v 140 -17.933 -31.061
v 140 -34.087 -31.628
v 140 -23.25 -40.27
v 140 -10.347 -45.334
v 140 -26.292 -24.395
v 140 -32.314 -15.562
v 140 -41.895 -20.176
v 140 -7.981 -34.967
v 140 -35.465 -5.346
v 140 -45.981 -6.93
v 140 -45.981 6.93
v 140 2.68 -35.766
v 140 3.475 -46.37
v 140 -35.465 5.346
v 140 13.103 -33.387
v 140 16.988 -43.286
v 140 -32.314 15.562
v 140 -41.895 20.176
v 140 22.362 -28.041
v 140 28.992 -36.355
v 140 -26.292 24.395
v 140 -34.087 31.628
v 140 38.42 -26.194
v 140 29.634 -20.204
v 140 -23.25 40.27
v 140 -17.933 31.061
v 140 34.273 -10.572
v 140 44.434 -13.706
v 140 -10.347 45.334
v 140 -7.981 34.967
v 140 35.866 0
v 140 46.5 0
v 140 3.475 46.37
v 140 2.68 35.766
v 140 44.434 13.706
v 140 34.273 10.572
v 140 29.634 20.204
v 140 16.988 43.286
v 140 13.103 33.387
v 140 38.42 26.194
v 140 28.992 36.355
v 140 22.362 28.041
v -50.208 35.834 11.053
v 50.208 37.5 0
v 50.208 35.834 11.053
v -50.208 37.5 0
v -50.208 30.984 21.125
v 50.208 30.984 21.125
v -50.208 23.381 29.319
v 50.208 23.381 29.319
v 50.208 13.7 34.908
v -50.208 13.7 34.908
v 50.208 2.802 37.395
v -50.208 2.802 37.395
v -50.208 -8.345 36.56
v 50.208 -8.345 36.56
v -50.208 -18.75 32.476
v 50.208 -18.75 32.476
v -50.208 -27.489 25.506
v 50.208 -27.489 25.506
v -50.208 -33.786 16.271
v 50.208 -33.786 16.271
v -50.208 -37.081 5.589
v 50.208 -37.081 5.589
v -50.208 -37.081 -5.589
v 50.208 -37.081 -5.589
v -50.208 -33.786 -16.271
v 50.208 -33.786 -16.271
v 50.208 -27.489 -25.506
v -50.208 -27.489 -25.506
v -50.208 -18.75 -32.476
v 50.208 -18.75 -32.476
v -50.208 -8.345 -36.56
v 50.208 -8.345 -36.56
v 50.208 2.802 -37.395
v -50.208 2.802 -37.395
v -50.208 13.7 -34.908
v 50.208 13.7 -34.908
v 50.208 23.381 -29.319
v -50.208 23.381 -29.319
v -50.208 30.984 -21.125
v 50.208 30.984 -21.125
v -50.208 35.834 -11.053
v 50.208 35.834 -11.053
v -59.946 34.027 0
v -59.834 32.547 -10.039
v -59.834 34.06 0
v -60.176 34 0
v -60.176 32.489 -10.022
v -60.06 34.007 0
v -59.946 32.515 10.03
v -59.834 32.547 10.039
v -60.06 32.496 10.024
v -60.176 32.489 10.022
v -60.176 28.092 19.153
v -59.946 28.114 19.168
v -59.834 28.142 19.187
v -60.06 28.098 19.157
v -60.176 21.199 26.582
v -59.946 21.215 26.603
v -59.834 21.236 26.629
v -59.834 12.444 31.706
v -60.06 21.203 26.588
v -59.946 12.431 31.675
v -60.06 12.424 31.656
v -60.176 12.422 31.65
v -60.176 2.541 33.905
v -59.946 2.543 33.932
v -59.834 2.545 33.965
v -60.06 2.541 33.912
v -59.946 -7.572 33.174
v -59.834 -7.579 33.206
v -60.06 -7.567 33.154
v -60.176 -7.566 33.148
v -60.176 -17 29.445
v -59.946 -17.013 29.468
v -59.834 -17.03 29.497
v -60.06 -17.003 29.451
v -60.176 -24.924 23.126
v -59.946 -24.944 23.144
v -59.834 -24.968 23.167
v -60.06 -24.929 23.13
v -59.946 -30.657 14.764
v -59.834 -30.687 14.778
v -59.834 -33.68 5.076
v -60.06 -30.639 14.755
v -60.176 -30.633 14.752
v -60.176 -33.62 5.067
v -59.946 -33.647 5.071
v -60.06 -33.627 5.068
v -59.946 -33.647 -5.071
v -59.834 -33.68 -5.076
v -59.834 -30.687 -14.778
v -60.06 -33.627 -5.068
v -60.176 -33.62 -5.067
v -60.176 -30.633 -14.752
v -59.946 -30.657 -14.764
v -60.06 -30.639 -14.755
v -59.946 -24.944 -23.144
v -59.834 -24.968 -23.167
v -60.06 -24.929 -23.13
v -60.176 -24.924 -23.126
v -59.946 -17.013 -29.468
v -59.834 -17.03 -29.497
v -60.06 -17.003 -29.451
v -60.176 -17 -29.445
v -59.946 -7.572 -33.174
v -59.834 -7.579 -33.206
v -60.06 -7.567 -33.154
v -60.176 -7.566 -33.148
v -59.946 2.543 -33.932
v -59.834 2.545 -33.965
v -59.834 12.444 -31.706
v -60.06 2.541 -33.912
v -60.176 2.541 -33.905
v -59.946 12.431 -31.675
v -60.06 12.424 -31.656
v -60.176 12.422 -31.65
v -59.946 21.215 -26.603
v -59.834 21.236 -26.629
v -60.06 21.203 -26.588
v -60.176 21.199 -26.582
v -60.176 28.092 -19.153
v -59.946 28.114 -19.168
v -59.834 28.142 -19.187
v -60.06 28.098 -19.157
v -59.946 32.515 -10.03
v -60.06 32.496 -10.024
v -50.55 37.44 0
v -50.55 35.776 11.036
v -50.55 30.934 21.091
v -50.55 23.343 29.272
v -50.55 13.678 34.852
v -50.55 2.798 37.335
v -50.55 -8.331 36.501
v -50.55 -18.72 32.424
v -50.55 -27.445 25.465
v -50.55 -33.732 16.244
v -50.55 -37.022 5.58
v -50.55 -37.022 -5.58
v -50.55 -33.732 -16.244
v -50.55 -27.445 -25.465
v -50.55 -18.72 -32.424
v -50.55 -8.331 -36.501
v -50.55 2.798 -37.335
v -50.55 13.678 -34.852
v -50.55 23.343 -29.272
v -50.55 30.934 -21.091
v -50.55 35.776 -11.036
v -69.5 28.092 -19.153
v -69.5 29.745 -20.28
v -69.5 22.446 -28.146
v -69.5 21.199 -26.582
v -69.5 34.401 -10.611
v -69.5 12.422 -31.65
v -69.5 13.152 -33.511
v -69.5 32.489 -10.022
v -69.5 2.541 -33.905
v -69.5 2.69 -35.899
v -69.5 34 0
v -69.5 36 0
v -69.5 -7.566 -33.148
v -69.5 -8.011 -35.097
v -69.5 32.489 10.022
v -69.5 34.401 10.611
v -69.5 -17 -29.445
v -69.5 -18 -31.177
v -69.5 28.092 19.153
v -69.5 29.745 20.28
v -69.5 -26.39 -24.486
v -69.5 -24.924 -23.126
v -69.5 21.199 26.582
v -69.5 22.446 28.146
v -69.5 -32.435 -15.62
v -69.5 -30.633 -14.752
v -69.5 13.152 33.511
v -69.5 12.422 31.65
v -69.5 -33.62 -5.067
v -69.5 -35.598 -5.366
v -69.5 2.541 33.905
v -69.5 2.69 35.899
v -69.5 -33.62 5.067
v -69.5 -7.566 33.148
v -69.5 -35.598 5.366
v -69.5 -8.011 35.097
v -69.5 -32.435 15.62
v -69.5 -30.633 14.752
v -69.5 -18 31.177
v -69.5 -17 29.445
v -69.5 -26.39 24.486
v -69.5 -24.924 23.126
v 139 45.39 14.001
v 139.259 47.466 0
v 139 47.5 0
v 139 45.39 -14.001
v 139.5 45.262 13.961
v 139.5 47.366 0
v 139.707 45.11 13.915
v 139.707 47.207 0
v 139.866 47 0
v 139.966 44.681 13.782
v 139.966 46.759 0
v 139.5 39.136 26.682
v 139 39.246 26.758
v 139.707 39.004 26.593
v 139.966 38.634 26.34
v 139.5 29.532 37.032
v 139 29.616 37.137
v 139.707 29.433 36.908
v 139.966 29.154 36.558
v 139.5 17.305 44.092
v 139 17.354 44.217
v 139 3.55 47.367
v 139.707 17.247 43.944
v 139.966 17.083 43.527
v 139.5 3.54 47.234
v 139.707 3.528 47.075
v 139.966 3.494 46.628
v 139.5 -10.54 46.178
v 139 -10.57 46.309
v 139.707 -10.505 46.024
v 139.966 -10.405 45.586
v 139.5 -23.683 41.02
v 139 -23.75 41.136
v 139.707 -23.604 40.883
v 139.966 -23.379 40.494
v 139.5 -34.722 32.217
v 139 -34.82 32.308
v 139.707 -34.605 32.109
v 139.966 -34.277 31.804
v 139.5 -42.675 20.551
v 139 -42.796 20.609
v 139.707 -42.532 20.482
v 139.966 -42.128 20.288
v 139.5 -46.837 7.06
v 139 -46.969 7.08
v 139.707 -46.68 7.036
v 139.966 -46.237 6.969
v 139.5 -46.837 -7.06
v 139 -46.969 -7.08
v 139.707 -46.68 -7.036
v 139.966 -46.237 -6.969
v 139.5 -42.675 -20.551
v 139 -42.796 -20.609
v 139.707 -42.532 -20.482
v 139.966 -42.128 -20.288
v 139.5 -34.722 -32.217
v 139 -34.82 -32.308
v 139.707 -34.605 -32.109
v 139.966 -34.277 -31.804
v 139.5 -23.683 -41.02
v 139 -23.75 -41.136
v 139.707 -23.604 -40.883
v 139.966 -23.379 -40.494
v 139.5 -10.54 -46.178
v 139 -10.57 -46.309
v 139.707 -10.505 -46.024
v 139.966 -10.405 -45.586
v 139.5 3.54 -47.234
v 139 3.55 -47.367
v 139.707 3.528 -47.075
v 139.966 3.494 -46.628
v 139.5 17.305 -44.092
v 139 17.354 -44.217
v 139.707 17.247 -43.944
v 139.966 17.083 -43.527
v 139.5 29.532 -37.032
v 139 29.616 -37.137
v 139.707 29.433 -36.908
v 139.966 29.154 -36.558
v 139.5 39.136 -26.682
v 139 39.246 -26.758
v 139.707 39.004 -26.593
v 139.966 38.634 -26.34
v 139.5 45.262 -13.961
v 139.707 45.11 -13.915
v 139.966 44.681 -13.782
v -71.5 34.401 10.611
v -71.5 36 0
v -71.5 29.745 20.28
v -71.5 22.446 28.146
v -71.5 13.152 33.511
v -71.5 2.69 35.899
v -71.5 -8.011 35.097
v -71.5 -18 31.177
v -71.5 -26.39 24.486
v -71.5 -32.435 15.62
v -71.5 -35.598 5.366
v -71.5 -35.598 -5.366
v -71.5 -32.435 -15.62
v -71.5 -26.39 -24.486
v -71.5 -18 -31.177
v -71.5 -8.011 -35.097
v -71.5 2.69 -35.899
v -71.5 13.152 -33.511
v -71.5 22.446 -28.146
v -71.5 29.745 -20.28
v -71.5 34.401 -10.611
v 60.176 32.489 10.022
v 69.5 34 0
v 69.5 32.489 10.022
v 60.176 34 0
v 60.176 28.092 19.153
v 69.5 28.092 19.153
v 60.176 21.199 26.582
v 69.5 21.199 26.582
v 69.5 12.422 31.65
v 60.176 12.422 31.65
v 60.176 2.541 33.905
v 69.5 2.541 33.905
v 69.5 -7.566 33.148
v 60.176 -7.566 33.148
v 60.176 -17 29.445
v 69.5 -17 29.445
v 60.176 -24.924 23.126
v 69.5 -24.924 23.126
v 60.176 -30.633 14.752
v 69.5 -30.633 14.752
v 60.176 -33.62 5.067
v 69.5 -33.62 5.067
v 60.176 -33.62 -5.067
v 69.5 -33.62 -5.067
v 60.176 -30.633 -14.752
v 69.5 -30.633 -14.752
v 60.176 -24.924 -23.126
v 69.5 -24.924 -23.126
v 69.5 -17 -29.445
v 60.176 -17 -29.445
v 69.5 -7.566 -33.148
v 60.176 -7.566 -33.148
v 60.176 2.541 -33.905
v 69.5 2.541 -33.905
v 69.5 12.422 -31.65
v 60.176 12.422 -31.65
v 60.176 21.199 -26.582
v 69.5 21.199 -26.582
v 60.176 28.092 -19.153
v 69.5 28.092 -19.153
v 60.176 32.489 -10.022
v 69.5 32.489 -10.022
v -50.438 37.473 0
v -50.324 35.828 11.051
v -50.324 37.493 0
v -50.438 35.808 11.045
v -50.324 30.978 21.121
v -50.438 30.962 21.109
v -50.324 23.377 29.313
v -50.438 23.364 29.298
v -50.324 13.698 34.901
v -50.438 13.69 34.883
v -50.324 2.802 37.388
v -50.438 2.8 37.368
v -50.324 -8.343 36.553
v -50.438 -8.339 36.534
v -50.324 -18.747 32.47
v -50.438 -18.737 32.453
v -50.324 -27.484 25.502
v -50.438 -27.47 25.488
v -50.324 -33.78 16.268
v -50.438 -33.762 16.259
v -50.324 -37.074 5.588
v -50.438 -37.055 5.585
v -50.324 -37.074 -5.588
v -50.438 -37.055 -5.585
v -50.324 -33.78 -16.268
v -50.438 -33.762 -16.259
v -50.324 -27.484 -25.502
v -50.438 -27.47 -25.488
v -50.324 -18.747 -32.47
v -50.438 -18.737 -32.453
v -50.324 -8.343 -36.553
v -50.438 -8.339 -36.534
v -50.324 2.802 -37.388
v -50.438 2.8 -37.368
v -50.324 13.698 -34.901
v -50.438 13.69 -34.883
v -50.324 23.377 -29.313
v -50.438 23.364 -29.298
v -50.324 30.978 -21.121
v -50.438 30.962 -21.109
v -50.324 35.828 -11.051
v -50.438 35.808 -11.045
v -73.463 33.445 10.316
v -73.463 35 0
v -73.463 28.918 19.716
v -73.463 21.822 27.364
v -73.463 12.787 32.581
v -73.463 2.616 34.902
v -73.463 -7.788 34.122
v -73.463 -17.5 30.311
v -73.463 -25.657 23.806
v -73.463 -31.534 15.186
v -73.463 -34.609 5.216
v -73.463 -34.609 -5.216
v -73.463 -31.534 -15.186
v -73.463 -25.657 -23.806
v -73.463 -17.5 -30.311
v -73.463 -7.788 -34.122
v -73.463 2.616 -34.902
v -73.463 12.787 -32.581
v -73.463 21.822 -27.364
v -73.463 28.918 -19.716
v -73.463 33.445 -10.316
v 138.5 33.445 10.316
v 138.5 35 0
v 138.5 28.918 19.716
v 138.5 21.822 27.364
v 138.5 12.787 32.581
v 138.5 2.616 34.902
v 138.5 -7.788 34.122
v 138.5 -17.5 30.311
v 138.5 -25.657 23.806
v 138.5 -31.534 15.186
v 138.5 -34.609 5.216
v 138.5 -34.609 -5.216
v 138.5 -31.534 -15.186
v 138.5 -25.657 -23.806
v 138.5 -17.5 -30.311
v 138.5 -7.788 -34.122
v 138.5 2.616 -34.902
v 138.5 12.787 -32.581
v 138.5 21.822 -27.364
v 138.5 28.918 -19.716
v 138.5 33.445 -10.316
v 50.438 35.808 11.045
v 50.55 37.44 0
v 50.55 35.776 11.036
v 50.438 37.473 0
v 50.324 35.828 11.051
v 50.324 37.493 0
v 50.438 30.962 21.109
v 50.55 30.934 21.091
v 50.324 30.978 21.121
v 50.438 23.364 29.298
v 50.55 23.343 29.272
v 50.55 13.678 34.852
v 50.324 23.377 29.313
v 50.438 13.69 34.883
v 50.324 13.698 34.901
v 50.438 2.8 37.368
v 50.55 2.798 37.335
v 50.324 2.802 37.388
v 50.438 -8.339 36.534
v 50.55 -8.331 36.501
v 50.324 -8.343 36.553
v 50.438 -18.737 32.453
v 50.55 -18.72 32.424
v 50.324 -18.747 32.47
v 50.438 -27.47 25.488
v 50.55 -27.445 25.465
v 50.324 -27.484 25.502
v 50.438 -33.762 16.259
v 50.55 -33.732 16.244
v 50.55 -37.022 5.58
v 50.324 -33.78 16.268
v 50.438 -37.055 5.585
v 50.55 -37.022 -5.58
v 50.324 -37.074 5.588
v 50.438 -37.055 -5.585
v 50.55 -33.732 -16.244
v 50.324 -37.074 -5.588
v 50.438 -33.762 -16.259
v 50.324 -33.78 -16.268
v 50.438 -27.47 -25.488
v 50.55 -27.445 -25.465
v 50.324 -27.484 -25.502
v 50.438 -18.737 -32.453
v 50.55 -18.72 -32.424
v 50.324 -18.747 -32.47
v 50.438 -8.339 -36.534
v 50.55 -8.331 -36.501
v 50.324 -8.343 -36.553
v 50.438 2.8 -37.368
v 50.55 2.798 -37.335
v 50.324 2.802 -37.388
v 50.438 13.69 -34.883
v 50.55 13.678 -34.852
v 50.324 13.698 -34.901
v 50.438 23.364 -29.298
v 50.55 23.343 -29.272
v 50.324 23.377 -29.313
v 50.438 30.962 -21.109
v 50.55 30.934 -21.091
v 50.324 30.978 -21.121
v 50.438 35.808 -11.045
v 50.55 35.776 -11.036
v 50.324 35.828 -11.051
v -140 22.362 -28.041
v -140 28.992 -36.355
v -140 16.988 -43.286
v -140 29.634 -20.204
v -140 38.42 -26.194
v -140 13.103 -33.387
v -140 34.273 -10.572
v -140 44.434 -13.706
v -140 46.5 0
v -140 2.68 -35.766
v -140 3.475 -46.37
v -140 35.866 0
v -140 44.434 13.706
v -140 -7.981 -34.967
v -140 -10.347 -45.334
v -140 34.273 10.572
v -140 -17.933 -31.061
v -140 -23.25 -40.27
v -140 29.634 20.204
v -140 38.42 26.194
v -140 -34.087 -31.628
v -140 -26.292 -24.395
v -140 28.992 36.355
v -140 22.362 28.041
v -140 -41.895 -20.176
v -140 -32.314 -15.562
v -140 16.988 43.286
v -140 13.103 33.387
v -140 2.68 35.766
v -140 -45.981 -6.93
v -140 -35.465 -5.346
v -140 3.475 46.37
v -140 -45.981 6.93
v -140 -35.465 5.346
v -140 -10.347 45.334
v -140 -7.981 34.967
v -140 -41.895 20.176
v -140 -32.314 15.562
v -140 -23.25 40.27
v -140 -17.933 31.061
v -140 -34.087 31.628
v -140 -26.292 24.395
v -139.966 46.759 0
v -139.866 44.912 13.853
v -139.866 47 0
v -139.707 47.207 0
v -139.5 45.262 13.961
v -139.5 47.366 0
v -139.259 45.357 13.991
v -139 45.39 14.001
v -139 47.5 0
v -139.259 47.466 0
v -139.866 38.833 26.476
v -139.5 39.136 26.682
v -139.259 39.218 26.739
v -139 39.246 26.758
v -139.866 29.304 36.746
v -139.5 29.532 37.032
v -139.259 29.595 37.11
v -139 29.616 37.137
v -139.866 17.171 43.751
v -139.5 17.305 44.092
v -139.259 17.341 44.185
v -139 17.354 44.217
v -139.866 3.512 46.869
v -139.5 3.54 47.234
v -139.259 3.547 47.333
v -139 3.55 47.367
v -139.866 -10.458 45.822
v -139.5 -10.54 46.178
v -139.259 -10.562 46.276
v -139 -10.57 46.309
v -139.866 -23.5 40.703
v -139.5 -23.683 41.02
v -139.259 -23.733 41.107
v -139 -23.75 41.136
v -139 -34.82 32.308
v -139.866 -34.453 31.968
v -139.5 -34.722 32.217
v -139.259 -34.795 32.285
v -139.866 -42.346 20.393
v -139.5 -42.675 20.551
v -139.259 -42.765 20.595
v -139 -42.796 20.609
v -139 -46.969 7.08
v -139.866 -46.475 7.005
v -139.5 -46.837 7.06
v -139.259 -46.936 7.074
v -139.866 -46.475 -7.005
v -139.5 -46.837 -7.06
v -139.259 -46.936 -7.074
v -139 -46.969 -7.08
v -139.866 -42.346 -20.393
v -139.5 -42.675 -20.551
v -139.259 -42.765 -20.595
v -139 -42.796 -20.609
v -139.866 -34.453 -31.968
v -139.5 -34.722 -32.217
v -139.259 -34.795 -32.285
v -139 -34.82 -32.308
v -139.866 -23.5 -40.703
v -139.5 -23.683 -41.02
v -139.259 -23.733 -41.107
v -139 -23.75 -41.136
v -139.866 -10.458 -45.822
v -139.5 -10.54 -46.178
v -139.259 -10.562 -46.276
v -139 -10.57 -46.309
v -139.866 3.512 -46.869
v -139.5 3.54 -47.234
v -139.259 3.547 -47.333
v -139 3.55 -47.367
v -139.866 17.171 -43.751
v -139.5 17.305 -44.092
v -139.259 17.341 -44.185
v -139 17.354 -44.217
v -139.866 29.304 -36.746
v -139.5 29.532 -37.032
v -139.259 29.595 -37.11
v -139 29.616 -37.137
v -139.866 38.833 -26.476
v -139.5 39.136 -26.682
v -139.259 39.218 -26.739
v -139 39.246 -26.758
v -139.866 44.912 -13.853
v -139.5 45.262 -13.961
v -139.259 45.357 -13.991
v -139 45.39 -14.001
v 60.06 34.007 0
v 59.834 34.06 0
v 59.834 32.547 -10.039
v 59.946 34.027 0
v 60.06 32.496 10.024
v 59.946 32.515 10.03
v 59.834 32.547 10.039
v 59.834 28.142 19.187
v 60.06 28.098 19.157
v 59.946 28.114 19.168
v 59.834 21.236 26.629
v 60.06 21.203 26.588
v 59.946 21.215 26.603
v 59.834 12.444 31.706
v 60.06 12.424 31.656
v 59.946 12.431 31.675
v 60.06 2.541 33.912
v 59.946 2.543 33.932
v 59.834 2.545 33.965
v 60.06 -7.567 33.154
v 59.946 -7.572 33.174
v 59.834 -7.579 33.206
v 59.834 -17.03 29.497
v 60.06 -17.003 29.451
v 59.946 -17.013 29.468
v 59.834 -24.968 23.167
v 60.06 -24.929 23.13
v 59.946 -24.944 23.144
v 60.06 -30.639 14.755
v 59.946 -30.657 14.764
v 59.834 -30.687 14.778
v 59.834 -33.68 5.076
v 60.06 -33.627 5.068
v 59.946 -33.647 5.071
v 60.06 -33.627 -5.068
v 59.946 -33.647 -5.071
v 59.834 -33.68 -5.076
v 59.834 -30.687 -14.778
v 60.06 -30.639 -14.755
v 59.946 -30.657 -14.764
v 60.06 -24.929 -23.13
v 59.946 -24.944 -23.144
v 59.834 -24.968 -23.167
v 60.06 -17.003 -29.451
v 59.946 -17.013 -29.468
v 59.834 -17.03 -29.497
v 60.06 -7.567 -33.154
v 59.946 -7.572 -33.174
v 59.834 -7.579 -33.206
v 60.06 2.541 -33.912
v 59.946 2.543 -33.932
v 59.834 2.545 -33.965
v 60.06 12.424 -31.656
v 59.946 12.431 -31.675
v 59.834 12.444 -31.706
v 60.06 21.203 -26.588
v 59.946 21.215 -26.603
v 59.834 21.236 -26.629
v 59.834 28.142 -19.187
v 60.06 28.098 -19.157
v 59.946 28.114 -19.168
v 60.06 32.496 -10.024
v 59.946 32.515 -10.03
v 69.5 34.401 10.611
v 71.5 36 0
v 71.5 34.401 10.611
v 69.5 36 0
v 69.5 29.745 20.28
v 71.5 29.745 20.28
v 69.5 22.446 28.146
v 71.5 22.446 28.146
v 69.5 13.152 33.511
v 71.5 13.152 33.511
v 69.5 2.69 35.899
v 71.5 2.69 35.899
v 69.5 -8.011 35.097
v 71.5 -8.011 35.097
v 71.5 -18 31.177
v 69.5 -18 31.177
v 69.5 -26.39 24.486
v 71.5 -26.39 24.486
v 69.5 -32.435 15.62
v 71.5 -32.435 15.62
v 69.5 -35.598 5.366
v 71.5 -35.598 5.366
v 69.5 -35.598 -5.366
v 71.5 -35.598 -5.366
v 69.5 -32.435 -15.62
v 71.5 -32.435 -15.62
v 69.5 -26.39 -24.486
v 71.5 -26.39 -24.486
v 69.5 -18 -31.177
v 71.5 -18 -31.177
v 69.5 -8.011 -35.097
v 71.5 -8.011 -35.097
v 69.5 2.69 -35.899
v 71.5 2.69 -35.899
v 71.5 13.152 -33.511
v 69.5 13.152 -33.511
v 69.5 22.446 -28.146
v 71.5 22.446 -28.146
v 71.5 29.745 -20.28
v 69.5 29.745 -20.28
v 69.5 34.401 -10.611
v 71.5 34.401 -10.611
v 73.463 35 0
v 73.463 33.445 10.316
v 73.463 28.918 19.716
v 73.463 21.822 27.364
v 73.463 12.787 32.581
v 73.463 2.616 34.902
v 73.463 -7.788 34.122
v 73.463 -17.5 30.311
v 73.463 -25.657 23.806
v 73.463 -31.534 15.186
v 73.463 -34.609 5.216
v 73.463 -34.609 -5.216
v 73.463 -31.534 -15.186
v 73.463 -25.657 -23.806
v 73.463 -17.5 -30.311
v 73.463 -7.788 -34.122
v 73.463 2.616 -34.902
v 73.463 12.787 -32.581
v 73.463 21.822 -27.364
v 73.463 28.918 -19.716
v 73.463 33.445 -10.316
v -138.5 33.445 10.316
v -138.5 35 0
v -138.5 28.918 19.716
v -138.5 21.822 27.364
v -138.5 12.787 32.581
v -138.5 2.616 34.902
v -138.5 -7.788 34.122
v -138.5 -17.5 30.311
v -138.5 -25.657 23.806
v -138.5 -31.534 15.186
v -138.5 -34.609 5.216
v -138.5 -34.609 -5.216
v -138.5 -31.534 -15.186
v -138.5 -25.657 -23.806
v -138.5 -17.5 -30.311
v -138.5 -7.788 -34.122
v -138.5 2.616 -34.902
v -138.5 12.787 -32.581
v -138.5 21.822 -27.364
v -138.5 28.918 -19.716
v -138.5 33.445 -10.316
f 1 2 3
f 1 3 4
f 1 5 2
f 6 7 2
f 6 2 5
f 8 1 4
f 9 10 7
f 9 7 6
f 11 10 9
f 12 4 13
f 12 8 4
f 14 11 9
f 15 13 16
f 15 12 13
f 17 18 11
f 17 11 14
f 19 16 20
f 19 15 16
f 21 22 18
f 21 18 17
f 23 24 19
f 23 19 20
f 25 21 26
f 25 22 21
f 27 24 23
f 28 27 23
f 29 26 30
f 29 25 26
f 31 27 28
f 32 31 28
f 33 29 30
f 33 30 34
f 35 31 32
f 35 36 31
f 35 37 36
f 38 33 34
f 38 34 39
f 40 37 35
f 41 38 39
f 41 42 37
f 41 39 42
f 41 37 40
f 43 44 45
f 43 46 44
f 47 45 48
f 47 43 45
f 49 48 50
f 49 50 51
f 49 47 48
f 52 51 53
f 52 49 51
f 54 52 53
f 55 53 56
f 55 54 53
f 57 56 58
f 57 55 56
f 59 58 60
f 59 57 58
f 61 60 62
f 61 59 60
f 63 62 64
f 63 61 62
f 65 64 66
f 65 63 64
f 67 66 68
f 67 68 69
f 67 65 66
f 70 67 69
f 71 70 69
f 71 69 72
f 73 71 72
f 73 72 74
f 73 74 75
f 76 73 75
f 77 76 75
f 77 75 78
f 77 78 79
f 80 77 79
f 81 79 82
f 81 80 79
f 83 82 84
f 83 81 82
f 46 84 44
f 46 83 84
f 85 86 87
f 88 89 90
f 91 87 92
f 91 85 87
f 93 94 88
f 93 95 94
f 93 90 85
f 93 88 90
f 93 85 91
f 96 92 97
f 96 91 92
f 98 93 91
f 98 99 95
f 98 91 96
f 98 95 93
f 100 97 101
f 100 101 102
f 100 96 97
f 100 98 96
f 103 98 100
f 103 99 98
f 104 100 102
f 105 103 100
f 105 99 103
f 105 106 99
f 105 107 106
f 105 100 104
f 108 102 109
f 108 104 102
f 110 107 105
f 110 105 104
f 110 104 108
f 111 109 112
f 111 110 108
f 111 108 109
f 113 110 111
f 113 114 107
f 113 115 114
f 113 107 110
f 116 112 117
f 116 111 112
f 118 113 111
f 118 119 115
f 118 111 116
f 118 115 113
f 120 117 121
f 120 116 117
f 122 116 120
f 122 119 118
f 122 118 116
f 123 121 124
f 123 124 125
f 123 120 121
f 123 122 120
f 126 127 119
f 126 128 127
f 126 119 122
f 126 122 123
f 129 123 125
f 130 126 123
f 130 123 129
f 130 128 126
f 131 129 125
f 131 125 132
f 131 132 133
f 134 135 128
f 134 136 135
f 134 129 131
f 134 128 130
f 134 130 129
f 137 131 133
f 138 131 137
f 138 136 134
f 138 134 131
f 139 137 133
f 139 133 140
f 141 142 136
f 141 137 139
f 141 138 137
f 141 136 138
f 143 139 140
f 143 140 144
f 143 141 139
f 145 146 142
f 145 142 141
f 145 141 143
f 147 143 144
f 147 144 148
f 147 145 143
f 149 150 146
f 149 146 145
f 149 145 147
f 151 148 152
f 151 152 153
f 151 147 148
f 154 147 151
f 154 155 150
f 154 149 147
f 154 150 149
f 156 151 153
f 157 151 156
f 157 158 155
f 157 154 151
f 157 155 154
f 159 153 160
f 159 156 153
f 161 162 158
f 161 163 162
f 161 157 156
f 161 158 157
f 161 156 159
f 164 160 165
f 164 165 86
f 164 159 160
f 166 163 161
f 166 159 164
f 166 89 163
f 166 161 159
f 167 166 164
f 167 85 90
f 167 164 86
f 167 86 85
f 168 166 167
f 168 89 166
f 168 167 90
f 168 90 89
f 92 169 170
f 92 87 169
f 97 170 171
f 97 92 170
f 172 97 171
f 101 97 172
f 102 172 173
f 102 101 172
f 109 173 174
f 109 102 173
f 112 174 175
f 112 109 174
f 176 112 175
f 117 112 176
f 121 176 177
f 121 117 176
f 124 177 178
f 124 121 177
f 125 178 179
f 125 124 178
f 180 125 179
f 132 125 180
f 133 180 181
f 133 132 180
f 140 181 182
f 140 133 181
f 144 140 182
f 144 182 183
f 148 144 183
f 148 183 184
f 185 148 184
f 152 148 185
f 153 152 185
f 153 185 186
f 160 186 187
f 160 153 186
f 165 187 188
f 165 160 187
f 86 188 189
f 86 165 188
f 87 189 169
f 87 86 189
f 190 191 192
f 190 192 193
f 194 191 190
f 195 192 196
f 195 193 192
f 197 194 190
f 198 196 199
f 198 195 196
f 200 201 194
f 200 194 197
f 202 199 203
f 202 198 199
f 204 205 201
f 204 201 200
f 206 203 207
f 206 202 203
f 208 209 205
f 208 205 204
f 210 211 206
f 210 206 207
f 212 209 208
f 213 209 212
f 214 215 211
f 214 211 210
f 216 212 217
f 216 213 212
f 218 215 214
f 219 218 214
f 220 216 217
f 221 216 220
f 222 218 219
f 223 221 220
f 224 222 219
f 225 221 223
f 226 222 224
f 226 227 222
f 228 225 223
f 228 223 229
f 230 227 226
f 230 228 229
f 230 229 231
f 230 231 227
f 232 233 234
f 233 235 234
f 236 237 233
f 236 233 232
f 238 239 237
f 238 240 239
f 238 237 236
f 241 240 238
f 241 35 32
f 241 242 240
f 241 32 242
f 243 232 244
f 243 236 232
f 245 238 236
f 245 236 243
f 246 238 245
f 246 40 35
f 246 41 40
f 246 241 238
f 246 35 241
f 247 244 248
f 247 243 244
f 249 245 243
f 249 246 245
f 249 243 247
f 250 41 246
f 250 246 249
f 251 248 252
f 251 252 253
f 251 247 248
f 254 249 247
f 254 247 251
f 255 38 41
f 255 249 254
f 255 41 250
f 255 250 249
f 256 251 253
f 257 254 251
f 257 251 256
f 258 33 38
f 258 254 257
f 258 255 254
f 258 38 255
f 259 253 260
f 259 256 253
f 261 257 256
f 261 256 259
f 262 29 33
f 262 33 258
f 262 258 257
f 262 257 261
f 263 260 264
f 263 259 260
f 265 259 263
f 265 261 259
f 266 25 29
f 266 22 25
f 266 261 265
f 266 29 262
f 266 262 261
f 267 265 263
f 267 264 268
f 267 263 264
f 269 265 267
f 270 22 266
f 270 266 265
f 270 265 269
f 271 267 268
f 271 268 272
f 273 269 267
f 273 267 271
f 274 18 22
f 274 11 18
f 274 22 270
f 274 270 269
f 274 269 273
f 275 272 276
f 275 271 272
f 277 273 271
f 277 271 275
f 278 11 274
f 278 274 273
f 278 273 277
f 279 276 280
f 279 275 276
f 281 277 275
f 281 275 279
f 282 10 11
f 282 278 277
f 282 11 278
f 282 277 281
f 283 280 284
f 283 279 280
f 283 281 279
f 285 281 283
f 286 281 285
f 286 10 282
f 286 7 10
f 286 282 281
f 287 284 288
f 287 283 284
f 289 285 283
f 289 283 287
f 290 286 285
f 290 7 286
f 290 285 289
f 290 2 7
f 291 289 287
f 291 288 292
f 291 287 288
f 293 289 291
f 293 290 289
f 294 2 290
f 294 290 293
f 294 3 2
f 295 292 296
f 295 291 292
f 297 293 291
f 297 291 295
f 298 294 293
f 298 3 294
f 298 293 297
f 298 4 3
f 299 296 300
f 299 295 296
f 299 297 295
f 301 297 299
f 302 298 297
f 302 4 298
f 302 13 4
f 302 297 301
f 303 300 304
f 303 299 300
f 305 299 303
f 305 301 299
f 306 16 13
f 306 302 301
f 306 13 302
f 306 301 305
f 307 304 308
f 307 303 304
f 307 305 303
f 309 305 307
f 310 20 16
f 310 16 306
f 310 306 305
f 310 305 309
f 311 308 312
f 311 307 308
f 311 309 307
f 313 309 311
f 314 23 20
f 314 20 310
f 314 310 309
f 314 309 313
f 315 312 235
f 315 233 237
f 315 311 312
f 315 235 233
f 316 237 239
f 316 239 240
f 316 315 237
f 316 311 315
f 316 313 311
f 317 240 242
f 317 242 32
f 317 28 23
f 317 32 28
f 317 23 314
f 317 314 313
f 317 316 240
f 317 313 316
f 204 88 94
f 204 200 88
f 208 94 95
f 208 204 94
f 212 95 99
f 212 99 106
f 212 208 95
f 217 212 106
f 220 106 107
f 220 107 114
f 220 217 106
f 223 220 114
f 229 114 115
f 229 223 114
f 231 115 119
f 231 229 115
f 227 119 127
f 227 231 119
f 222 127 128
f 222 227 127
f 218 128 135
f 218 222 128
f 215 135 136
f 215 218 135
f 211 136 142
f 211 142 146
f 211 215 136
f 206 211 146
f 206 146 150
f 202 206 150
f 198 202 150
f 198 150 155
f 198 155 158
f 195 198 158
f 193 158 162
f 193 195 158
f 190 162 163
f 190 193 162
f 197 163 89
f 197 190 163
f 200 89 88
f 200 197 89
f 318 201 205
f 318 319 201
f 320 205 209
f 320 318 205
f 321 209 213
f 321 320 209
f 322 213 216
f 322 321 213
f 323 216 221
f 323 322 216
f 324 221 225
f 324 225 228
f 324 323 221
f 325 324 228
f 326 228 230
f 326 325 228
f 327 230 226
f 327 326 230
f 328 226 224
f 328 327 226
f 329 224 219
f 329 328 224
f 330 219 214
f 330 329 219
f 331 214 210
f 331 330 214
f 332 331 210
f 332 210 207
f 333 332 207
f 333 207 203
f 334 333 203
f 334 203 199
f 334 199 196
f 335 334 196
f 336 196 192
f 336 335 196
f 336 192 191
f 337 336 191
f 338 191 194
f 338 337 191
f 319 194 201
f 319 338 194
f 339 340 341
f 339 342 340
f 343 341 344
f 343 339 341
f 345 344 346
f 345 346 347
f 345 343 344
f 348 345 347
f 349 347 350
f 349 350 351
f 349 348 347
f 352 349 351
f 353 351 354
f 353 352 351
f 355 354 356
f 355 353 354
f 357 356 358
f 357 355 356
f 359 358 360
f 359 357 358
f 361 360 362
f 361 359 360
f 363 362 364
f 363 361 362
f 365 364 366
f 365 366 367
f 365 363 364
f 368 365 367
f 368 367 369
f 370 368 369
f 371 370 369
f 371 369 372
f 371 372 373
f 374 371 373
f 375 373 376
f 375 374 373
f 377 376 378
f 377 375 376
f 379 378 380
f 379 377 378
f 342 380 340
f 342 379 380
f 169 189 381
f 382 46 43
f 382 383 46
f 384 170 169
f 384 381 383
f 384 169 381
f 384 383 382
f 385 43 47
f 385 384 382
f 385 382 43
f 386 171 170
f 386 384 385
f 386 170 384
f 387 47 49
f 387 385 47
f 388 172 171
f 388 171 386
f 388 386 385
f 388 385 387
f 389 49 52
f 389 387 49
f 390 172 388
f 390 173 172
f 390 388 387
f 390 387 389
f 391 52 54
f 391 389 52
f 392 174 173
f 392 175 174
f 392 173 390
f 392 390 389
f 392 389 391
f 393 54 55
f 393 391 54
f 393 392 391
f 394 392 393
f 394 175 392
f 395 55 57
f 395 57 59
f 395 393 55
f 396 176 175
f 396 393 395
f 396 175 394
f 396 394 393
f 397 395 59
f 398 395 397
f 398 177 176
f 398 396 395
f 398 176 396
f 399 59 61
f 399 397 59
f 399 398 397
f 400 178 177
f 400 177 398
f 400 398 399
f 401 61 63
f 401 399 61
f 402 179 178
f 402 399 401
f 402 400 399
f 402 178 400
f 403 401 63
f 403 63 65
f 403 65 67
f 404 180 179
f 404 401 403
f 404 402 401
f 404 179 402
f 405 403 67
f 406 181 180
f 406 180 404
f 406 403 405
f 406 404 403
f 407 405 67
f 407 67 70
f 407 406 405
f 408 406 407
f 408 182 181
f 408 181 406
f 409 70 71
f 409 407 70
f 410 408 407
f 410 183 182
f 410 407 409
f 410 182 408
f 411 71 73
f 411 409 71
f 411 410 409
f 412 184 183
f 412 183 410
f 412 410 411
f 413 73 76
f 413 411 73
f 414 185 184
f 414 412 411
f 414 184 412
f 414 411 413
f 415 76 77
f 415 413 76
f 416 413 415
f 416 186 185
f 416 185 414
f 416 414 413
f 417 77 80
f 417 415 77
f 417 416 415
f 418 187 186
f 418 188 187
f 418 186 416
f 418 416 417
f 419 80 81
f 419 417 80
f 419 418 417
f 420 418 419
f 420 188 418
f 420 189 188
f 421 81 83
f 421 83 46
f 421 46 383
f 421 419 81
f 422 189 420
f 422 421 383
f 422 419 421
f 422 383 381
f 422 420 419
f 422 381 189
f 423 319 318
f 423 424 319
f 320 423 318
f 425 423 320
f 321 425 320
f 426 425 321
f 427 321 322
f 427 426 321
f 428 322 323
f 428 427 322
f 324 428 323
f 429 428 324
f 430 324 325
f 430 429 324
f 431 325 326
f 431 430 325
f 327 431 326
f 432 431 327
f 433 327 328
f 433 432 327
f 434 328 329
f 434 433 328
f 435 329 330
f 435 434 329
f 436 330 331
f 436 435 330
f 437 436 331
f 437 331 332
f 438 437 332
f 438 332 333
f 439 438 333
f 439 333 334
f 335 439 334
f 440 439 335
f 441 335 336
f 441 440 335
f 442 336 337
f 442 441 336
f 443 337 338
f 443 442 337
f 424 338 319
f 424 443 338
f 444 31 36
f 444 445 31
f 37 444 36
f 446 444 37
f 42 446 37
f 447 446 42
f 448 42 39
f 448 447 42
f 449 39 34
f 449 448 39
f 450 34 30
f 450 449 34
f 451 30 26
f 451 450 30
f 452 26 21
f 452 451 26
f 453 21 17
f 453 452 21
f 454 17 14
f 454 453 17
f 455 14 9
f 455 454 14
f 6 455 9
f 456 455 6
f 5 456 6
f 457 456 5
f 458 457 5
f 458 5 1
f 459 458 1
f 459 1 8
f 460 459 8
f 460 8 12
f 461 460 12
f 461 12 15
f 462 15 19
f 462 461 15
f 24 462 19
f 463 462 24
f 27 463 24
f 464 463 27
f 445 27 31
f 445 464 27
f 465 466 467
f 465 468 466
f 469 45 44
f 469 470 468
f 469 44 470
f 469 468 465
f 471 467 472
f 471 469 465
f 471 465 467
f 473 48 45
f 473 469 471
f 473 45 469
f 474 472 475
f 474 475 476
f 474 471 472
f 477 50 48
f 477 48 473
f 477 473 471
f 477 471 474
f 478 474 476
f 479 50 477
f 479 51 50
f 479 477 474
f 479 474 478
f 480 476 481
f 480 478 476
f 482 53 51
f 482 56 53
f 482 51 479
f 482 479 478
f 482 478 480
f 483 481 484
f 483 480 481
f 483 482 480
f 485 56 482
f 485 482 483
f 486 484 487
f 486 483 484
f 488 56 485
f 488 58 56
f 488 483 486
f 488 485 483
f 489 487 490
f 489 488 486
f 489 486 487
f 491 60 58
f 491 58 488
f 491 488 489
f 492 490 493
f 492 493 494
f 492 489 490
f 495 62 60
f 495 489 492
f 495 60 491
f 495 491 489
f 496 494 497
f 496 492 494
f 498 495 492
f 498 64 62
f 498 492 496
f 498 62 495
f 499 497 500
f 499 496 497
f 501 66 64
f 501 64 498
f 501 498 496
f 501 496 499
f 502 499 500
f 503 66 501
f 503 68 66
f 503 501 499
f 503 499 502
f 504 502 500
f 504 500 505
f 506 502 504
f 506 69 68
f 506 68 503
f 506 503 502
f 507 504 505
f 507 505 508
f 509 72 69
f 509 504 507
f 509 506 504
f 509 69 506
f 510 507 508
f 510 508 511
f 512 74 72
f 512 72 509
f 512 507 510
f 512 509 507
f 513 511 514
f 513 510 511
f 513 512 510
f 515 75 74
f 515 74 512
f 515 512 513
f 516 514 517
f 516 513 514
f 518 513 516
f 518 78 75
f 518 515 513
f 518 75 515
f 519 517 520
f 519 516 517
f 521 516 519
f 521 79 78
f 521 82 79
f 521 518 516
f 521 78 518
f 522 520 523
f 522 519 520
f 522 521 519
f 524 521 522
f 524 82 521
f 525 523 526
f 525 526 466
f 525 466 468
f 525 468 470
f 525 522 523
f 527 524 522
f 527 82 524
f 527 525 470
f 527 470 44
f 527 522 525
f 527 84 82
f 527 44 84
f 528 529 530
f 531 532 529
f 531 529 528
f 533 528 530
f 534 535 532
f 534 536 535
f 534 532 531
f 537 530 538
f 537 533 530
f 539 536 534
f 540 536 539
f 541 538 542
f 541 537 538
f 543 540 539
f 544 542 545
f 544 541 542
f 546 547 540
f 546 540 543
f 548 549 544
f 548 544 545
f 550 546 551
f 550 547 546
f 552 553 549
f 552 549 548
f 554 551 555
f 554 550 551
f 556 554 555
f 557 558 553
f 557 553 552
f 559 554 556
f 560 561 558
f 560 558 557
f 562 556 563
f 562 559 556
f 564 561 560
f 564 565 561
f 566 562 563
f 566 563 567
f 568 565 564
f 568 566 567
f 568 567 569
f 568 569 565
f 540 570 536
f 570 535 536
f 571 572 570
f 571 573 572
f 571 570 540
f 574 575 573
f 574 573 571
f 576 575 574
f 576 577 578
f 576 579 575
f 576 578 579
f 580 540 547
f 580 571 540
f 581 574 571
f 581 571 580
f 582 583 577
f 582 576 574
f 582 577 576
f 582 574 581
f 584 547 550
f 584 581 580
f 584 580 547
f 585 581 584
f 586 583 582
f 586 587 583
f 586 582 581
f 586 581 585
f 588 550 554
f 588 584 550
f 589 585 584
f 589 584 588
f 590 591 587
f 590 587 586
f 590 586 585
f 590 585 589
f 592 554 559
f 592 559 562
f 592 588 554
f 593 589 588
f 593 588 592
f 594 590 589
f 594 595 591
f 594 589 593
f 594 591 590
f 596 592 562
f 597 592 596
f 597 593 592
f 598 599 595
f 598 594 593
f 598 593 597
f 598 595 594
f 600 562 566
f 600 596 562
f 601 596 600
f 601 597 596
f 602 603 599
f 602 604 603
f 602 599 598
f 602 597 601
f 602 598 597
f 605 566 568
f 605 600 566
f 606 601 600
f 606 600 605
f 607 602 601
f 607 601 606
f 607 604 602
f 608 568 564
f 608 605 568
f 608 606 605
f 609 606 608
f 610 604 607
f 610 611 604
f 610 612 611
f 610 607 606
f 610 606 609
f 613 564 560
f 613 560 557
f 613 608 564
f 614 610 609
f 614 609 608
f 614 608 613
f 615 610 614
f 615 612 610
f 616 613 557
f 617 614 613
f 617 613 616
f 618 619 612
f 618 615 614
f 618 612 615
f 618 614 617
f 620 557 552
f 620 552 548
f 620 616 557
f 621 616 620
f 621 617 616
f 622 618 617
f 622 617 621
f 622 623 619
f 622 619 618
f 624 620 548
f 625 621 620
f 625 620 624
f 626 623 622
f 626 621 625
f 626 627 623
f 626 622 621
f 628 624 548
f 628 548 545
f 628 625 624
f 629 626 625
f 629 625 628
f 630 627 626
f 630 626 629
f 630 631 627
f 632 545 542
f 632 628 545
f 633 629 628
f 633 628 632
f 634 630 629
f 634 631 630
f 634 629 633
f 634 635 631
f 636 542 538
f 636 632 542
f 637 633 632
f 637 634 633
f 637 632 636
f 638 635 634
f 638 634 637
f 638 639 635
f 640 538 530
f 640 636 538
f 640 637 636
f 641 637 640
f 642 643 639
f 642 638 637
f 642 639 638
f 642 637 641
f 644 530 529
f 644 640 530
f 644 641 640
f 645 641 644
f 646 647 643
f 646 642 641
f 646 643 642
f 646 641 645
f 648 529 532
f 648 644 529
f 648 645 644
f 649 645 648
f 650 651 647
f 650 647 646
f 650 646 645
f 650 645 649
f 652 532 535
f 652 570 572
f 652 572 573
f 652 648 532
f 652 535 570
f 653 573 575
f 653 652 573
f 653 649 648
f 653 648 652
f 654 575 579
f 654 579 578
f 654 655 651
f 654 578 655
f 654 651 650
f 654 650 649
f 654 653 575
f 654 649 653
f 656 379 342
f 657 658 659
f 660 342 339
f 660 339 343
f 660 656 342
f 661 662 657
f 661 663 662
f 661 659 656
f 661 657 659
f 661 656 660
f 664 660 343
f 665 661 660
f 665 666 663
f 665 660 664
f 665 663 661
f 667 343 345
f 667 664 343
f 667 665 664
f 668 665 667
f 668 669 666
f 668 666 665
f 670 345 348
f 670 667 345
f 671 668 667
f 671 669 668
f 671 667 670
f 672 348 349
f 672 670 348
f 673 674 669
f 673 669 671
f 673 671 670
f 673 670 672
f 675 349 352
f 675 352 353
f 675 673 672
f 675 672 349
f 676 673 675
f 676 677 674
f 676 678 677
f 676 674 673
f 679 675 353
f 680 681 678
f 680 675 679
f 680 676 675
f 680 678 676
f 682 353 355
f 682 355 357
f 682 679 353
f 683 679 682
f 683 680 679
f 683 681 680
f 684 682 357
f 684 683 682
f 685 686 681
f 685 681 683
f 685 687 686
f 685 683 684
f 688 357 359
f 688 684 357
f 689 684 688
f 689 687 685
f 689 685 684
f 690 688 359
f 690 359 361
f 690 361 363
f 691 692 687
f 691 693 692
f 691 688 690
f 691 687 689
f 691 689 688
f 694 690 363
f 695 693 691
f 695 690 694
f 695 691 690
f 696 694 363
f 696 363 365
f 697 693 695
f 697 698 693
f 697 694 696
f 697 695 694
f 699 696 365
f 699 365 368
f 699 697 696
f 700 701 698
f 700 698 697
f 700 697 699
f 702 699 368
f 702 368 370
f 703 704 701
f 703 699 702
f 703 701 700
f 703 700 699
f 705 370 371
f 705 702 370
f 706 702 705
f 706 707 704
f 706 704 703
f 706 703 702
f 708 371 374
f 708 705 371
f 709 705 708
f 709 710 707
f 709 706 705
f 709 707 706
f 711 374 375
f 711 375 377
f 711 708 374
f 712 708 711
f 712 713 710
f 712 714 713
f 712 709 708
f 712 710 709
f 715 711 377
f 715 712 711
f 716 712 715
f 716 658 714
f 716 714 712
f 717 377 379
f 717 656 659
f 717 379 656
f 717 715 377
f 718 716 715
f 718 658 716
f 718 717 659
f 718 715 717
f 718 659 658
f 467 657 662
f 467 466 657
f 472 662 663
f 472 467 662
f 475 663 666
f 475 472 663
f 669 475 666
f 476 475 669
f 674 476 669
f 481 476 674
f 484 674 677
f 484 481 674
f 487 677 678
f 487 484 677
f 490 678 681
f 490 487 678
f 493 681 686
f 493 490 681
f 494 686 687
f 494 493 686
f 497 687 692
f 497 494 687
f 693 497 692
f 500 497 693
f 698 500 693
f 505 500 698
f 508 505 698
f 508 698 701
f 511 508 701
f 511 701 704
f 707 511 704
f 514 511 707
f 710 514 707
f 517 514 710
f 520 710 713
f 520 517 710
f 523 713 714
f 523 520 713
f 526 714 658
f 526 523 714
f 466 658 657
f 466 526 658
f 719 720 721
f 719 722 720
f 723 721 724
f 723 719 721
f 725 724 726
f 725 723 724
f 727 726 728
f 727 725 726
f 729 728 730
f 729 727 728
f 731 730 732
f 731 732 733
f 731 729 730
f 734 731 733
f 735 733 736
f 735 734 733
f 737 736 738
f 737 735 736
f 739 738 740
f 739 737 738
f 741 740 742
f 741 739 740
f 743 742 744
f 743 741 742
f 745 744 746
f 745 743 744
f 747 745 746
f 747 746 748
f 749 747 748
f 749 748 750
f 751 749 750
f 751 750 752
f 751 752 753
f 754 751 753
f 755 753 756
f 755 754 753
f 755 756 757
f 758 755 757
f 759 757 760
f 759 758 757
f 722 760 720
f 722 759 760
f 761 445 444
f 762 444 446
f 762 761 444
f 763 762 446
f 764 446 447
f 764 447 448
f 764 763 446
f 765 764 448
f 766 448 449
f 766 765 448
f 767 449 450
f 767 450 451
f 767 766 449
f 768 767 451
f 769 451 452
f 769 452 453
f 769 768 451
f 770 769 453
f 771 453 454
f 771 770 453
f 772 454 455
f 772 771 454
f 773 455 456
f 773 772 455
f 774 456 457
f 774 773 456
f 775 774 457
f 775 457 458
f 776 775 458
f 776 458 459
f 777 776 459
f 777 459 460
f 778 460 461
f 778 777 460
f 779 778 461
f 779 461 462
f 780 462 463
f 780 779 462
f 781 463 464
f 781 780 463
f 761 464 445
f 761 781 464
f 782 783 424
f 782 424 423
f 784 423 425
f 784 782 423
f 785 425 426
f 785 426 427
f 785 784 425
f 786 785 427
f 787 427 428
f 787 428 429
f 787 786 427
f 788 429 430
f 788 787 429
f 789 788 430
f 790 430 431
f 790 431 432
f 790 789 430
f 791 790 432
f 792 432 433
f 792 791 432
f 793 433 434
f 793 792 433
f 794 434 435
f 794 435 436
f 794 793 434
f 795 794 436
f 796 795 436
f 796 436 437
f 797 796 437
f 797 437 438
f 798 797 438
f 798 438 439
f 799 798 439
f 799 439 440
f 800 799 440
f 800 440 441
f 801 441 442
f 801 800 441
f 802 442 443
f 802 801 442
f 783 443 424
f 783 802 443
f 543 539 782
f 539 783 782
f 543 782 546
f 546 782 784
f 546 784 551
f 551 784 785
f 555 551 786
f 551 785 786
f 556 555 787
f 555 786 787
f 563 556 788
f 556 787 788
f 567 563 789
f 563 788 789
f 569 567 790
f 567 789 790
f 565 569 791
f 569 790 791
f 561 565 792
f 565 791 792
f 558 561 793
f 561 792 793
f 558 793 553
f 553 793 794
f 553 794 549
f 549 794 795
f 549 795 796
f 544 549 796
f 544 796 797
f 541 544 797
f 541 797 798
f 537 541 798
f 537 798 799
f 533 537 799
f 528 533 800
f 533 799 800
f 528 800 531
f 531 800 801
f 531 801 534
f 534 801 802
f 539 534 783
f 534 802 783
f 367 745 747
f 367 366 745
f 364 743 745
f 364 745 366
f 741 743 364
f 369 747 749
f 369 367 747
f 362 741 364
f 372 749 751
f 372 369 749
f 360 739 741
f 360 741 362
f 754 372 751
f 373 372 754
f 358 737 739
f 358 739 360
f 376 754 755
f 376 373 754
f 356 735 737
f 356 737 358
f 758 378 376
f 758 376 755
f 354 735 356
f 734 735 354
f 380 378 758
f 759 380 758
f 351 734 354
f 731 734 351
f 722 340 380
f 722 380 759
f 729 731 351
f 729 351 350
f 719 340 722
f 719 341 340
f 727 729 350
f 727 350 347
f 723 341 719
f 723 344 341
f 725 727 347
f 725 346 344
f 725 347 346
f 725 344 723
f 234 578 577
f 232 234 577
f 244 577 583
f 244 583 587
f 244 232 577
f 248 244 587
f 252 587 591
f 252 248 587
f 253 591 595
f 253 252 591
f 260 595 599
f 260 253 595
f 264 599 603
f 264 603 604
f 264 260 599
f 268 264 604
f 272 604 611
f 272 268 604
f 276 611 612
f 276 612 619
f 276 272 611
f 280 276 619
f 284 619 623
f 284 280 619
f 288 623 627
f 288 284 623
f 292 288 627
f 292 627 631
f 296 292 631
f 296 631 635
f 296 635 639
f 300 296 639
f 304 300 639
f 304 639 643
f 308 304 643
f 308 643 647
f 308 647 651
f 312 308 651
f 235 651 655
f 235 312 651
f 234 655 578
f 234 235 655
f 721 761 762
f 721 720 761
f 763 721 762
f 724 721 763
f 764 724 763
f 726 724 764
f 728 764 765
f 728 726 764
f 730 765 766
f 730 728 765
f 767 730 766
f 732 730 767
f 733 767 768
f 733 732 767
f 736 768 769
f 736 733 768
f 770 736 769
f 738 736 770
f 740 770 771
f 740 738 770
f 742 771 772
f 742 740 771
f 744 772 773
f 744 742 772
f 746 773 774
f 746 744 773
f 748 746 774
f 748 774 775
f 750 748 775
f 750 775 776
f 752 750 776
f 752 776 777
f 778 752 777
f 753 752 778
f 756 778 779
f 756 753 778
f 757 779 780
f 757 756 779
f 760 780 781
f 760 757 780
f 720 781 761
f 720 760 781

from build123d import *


with BuildPart() as part:
    # Sketch1 → Base-Revolve (revolve)
    with BuildSketch(Plane.XY):
        with BuildLine():
            Line((-140, 35), (-140, 46.5))
            ThreePointArc((-140, 46.5), (-139.707106781, 47.207106781), (-139, 47.5))
            Line((-139, 47.5), (139, 47.5))
            ThreePointArc((139, 47.5), (139.707106781, 47.207106781), (140, 46.5))
            Line((140, 46.5), (140, 35))
            Line((140, 35), (73.462610506, 35))
            Line((73.462610506, 35), (71.5, 36))
            Line((71.5, 36), (69.5, 36))
            Line((69.5, 36), (69.5, 34))
            Line((69.5, 34), (60.176326981, 34))
            ThreePointArc((60.176326981, 34), (60.002678803, 34.015192247), (59.834306837, 34.060307379))
            Line((59.834306837, 34.060307379), (50.549522195, 37.439692621))
            ThreePointArc((50.549522195, 37.439692621), (50.381150229, 37.484807753), (50.207502051, 37.5))
            Line((50.207502051, 37.5), (-50.207502051, 37.5))
            ThreePointArc((-50.207502051, 37.5), (-50.381150229, 37.484807753), (-50.549522195, 37.439692621))
            Line((-50.549522195, 37.439692621), (-59.834306837, 34.060307379))
            ThreePointArc((-59.834306837, 34.060307379), (-60.002678803, 34.015192247), (-60.176326981, 34))
            Line((-60.176326981, 34), (-69.5, 34))
            Line((-69.5, 34), (-69.5, 36))
            Line((-69.5, 36), (-71.5, 36))
            Line((-71.5, 36), (-73.462610506, 35))
            Line((-73.462610506, 35), (-140, 35))
        make_face()
    revolve(axis=Axis((-140, 0, 0), (1, 0, 0)))

    # Sketch5 → 2.5 x 30 gr reifning (revolve, cut)
    with BuildSketch(Plane.XY):
        Polygon((140, 35.866025404), (138.5, 35), (140, 35), align=None)
        Polygon((-140, 35), (-140, 35.866025404), (-138.5, 35), align=None)
    revolve(axis=Axis((0, 0, 0), (1, 0, 0)), mode=Mode.SUBTRACT)


solid = part.part
